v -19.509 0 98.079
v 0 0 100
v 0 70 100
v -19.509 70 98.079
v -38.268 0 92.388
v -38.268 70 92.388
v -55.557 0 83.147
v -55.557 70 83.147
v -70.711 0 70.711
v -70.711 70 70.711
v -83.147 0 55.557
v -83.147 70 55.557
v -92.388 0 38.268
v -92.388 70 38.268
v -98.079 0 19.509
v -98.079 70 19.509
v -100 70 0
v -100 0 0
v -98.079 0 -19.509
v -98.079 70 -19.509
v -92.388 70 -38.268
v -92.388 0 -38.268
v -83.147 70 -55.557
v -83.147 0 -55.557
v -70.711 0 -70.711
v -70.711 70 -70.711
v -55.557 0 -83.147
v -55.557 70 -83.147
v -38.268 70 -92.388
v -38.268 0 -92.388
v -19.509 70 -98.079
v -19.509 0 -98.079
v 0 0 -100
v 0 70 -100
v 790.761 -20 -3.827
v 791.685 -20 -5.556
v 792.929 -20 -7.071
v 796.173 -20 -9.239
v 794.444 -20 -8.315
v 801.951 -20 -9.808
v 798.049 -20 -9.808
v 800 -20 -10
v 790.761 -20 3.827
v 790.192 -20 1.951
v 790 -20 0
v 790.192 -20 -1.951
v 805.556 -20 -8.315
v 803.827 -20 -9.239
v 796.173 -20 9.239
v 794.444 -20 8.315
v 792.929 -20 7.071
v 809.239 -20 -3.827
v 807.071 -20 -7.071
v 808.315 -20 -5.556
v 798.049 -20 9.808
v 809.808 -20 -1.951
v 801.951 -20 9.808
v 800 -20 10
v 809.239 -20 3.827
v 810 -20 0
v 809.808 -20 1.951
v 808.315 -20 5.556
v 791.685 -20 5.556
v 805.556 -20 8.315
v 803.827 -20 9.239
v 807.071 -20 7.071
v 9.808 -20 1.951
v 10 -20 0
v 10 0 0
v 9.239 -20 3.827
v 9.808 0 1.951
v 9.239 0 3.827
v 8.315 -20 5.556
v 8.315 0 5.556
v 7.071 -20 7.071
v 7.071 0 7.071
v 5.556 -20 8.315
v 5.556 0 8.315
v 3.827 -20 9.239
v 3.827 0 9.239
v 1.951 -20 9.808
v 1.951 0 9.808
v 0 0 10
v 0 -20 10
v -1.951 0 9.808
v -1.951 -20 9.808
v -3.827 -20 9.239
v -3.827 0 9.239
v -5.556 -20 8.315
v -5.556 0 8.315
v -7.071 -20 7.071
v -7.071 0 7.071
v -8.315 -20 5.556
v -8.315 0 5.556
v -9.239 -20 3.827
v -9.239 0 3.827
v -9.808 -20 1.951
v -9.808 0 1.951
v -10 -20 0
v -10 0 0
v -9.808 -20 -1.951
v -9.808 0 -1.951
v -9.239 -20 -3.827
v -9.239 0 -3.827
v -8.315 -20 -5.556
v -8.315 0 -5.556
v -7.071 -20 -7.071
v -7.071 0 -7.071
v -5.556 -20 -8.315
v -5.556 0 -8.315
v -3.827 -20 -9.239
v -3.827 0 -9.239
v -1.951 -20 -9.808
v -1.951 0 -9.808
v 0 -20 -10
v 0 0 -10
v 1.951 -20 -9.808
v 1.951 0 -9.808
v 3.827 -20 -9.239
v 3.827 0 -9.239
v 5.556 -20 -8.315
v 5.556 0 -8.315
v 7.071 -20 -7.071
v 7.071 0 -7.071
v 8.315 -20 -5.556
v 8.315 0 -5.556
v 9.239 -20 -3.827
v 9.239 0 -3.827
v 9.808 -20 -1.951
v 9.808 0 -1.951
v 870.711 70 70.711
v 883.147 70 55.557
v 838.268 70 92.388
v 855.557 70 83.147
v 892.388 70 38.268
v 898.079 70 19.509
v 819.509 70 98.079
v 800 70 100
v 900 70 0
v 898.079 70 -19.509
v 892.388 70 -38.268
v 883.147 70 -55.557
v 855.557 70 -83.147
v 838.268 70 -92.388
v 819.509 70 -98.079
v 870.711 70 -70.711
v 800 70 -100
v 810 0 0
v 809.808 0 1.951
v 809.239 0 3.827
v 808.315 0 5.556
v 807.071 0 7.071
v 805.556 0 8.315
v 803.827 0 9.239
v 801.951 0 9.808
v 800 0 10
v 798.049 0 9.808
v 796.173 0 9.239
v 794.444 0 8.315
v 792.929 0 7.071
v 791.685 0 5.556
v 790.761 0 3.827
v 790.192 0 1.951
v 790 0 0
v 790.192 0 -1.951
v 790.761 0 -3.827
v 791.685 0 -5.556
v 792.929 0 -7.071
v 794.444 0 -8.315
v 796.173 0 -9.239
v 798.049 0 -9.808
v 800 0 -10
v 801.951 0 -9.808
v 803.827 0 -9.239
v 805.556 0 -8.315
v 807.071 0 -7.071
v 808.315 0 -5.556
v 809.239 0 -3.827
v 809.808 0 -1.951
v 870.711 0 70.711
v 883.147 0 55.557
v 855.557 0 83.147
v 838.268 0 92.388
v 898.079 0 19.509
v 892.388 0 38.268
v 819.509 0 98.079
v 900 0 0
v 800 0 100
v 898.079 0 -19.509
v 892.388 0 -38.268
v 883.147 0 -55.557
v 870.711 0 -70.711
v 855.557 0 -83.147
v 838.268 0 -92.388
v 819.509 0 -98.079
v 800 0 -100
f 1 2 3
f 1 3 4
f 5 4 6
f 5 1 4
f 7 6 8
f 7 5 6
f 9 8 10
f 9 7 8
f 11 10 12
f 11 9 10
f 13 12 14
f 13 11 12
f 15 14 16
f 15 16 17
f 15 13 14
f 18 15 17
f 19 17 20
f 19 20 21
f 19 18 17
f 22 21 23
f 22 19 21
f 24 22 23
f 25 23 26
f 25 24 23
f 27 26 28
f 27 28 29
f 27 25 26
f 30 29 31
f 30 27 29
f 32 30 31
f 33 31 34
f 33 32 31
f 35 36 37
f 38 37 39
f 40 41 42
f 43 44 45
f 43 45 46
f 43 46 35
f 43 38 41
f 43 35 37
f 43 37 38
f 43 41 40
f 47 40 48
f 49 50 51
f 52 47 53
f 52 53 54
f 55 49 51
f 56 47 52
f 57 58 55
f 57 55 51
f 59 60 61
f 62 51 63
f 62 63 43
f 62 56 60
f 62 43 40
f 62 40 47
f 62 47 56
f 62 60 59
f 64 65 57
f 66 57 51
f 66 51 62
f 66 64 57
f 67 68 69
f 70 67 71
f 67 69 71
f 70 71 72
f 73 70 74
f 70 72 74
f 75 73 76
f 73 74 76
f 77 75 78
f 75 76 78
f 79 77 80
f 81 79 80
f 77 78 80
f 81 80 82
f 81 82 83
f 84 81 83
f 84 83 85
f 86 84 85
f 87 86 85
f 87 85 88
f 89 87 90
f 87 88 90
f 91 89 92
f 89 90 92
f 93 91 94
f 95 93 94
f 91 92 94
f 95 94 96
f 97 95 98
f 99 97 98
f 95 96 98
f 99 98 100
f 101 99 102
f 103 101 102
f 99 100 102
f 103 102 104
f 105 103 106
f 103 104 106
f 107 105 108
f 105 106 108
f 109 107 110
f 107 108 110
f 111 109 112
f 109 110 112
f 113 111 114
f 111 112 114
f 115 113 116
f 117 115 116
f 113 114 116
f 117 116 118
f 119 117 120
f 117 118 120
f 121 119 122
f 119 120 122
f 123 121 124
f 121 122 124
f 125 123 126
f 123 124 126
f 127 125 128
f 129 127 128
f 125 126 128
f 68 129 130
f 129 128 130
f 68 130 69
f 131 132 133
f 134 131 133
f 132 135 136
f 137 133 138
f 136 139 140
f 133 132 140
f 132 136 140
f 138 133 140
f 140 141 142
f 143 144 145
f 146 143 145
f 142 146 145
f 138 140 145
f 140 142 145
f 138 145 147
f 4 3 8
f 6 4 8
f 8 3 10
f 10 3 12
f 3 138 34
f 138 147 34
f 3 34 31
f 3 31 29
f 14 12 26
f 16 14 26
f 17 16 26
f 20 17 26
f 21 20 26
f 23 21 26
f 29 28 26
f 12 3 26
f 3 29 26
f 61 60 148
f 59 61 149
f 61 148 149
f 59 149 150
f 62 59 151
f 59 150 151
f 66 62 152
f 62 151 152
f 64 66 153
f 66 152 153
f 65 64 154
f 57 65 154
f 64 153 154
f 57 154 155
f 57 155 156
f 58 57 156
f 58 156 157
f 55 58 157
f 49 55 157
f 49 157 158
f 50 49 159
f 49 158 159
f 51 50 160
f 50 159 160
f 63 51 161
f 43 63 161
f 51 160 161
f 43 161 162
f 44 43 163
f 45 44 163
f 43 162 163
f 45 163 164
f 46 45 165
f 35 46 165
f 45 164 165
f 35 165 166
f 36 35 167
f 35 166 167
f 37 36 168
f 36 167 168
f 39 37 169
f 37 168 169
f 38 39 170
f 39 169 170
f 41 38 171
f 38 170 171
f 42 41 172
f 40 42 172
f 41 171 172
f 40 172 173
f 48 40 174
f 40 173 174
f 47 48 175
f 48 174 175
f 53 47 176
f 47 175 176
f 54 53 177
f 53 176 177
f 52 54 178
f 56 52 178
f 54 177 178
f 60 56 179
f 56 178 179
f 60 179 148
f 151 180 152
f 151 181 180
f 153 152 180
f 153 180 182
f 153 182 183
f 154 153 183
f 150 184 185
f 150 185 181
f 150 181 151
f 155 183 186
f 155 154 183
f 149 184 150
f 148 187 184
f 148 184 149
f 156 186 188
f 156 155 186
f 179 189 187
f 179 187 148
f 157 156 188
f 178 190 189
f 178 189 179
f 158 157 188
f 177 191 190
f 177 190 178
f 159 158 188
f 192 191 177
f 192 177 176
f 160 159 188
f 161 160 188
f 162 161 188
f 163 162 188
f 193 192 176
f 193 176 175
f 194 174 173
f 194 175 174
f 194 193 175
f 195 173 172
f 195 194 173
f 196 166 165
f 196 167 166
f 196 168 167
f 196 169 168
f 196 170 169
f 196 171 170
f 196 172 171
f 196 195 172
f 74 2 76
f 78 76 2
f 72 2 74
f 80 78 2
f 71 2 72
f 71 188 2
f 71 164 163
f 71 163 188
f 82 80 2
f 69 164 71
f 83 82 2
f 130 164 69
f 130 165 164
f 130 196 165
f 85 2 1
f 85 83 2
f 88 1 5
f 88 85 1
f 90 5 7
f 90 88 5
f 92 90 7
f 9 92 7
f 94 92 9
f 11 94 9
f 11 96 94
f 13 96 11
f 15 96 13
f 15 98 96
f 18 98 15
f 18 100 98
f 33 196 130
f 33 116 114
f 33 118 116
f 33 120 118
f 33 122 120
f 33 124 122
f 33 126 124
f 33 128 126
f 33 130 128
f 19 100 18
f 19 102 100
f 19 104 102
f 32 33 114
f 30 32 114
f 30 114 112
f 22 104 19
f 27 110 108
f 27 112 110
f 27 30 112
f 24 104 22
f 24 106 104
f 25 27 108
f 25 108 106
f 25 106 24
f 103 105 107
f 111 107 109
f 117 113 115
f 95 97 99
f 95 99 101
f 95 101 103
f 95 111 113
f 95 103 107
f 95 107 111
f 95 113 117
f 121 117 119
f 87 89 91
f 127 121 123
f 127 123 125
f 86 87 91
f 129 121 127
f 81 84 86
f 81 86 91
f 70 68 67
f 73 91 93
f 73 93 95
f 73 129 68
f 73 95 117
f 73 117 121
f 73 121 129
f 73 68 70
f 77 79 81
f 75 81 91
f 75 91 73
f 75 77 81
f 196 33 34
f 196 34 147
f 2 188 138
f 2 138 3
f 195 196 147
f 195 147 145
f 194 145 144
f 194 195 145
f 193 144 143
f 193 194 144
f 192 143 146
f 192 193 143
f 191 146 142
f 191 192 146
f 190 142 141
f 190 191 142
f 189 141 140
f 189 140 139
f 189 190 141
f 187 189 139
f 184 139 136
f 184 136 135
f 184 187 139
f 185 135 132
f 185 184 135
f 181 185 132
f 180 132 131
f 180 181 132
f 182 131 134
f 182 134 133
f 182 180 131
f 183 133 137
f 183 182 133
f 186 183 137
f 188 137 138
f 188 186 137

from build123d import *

# Parameters (mm, degrees)
BOSS_EXTRUDE1_DEPTH = 70
SKETCH3_R           = 10
BOSS_EXTRUDE2_DEPTH = 20
SKETCH4_R           = 10
BOSS_EXTRUDE3_DEPTH = 20


with BuildPart() as part:
    # Sketch2 → Boss-Extrude1 (new body)
    with BuildSketch(Plane(origin=(0, 0, 0), x_dir=(1, 0, 0), z_dir=(0, 1, 0))):
        with BuildLine():
            Line((0, 100), (800, 100))
            ThreePointArc((800, 100), (900, 0), (800, -100))
            Line((800, -100), (0, -100))
            ThreePointArc((0, -100), (-100, 0), (0, 100))
        make_face()
    extrude(amount=BOSS_EXTRUDE1_DEPTH)

    # Sketch3 → Boss-Extrude2 (add)
    with BuildSketch(Plane.XZ):
        Circle(SKETCH3_R)
    extrude(amount=BOSS_EXTRUDE2_DEPTH)

    # Sketch4 → Boss-Extrude3 (add)
    with BuildSketch(Plane.XZ):
        with Locations((800, 0)):
            Circle(SKETCH4_R)
    extrude(amount=BOSS_EXTRUDE3_DEPTH)


solid = part.part
